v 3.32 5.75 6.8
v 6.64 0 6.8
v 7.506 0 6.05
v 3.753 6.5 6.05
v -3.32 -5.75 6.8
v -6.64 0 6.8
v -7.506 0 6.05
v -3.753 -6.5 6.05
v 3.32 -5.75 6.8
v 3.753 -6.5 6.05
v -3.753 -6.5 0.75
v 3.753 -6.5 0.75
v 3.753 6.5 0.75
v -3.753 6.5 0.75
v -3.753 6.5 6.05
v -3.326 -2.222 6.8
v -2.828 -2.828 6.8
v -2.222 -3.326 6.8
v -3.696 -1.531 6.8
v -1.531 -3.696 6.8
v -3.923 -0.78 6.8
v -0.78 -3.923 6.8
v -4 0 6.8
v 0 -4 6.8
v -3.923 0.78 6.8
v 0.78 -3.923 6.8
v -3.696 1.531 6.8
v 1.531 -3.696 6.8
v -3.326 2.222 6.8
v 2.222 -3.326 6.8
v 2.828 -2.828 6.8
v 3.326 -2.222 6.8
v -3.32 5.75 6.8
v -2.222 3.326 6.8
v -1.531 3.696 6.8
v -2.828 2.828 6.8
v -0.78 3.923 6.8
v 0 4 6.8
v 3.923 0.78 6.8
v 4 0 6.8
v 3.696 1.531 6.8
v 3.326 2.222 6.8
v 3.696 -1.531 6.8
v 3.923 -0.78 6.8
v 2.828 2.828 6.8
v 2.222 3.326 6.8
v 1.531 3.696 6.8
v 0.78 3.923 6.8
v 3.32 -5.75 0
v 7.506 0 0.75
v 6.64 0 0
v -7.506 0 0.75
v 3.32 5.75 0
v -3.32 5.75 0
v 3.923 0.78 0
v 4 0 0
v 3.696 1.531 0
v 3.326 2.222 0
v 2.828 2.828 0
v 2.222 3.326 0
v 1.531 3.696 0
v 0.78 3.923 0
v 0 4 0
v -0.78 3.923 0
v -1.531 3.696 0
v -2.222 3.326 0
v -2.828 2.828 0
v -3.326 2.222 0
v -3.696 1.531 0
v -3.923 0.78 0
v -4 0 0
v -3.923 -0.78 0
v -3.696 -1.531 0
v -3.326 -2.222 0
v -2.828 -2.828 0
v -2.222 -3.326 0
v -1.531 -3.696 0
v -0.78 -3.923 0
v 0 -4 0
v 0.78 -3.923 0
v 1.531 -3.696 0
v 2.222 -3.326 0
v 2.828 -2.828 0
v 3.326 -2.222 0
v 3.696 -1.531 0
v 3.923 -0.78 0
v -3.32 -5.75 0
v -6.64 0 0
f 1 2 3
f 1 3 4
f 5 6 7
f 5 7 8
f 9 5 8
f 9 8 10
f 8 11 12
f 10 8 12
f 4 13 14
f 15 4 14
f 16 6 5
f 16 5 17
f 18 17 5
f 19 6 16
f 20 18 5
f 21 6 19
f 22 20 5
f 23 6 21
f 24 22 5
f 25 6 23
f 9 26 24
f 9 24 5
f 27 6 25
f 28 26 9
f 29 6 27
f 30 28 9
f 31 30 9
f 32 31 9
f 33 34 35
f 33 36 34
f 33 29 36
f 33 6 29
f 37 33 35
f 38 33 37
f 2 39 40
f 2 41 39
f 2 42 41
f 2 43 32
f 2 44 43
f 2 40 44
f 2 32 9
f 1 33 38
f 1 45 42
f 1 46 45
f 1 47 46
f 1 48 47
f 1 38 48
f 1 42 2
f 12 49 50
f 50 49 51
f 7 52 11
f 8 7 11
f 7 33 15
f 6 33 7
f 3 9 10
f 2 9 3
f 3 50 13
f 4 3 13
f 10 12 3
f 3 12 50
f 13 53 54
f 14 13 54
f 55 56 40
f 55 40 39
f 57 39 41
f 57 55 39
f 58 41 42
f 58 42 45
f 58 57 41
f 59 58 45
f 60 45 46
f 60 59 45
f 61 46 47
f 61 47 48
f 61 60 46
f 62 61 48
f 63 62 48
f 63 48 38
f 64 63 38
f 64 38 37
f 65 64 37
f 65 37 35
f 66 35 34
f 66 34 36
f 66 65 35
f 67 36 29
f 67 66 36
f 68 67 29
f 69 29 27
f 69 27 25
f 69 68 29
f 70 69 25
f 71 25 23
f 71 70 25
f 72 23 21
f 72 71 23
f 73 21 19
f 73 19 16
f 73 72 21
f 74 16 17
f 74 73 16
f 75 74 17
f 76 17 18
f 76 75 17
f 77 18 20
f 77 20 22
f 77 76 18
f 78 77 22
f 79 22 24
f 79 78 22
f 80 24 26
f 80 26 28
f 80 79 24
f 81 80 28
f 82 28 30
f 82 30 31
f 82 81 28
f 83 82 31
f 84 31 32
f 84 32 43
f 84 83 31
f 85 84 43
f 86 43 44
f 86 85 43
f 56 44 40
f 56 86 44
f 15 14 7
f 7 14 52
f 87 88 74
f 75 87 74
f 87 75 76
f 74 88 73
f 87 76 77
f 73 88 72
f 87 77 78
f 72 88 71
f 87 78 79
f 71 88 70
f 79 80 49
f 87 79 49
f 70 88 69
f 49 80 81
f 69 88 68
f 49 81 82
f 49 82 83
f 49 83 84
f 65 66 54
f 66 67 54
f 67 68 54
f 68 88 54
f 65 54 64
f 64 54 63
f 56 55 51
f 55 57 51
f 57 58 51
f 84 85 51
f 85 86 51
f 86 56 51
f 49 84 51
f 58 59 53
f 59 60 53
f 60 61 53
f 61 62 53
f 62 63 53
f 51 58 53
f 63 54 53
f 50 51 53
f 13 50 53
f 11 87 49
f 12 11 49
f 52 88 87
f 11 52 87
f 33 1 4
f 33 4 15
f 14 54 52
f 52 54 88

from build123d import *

# Parameters (mm, degrees)
SKETCH_1_R      = 4
EXTRUDE_1_DEPTH = 6.8
CHAMFER_1_SIZE  = 0.75


with BuildPart() as part:
    # Эскиз1 → Бобышка-Вытянуть1 (new body)
    with BuildSketch(Plane.XY):
        Polygon((3.75277675, -6.5), (7.505553499, 0), (3.75277675, 6.5), (-3.75277675, 6.5), (-7.505553499, 0), (-3.75277675, -6.5), align=None)
        Circle(SKETCH_1_R, mode=Mode.SUBTRACT)
    extrude(amount=EXTRUDE_1_DEPTH)

    # Фаска1
    chamfer_1_edges = [part.edges().sort_by_distance(p)[0] for p in [
        (5.629165125, 3.25, 6.8),
        (0, 6.5, 6.8),
        (-5.629165125, 3.25, 6.8),
        (-5.629165125, -3.25, 6.8),
        (0, -6.5, 6.8),
        (-5.629165125, -3.25, 0),
        (-5.629165125, 3.25, 0),
        (0, 6.5, 0),
        (5.629165125, 3.25, 0),
        (5.629165125, -3.25, 0),
        (0, -6.5, 0),
        (5.629165125, -3.25, 6.8),
    ]]
    chamfer(chamfer_1_edges, length=CHAMFER_1_SIZE)


solid = part.part
